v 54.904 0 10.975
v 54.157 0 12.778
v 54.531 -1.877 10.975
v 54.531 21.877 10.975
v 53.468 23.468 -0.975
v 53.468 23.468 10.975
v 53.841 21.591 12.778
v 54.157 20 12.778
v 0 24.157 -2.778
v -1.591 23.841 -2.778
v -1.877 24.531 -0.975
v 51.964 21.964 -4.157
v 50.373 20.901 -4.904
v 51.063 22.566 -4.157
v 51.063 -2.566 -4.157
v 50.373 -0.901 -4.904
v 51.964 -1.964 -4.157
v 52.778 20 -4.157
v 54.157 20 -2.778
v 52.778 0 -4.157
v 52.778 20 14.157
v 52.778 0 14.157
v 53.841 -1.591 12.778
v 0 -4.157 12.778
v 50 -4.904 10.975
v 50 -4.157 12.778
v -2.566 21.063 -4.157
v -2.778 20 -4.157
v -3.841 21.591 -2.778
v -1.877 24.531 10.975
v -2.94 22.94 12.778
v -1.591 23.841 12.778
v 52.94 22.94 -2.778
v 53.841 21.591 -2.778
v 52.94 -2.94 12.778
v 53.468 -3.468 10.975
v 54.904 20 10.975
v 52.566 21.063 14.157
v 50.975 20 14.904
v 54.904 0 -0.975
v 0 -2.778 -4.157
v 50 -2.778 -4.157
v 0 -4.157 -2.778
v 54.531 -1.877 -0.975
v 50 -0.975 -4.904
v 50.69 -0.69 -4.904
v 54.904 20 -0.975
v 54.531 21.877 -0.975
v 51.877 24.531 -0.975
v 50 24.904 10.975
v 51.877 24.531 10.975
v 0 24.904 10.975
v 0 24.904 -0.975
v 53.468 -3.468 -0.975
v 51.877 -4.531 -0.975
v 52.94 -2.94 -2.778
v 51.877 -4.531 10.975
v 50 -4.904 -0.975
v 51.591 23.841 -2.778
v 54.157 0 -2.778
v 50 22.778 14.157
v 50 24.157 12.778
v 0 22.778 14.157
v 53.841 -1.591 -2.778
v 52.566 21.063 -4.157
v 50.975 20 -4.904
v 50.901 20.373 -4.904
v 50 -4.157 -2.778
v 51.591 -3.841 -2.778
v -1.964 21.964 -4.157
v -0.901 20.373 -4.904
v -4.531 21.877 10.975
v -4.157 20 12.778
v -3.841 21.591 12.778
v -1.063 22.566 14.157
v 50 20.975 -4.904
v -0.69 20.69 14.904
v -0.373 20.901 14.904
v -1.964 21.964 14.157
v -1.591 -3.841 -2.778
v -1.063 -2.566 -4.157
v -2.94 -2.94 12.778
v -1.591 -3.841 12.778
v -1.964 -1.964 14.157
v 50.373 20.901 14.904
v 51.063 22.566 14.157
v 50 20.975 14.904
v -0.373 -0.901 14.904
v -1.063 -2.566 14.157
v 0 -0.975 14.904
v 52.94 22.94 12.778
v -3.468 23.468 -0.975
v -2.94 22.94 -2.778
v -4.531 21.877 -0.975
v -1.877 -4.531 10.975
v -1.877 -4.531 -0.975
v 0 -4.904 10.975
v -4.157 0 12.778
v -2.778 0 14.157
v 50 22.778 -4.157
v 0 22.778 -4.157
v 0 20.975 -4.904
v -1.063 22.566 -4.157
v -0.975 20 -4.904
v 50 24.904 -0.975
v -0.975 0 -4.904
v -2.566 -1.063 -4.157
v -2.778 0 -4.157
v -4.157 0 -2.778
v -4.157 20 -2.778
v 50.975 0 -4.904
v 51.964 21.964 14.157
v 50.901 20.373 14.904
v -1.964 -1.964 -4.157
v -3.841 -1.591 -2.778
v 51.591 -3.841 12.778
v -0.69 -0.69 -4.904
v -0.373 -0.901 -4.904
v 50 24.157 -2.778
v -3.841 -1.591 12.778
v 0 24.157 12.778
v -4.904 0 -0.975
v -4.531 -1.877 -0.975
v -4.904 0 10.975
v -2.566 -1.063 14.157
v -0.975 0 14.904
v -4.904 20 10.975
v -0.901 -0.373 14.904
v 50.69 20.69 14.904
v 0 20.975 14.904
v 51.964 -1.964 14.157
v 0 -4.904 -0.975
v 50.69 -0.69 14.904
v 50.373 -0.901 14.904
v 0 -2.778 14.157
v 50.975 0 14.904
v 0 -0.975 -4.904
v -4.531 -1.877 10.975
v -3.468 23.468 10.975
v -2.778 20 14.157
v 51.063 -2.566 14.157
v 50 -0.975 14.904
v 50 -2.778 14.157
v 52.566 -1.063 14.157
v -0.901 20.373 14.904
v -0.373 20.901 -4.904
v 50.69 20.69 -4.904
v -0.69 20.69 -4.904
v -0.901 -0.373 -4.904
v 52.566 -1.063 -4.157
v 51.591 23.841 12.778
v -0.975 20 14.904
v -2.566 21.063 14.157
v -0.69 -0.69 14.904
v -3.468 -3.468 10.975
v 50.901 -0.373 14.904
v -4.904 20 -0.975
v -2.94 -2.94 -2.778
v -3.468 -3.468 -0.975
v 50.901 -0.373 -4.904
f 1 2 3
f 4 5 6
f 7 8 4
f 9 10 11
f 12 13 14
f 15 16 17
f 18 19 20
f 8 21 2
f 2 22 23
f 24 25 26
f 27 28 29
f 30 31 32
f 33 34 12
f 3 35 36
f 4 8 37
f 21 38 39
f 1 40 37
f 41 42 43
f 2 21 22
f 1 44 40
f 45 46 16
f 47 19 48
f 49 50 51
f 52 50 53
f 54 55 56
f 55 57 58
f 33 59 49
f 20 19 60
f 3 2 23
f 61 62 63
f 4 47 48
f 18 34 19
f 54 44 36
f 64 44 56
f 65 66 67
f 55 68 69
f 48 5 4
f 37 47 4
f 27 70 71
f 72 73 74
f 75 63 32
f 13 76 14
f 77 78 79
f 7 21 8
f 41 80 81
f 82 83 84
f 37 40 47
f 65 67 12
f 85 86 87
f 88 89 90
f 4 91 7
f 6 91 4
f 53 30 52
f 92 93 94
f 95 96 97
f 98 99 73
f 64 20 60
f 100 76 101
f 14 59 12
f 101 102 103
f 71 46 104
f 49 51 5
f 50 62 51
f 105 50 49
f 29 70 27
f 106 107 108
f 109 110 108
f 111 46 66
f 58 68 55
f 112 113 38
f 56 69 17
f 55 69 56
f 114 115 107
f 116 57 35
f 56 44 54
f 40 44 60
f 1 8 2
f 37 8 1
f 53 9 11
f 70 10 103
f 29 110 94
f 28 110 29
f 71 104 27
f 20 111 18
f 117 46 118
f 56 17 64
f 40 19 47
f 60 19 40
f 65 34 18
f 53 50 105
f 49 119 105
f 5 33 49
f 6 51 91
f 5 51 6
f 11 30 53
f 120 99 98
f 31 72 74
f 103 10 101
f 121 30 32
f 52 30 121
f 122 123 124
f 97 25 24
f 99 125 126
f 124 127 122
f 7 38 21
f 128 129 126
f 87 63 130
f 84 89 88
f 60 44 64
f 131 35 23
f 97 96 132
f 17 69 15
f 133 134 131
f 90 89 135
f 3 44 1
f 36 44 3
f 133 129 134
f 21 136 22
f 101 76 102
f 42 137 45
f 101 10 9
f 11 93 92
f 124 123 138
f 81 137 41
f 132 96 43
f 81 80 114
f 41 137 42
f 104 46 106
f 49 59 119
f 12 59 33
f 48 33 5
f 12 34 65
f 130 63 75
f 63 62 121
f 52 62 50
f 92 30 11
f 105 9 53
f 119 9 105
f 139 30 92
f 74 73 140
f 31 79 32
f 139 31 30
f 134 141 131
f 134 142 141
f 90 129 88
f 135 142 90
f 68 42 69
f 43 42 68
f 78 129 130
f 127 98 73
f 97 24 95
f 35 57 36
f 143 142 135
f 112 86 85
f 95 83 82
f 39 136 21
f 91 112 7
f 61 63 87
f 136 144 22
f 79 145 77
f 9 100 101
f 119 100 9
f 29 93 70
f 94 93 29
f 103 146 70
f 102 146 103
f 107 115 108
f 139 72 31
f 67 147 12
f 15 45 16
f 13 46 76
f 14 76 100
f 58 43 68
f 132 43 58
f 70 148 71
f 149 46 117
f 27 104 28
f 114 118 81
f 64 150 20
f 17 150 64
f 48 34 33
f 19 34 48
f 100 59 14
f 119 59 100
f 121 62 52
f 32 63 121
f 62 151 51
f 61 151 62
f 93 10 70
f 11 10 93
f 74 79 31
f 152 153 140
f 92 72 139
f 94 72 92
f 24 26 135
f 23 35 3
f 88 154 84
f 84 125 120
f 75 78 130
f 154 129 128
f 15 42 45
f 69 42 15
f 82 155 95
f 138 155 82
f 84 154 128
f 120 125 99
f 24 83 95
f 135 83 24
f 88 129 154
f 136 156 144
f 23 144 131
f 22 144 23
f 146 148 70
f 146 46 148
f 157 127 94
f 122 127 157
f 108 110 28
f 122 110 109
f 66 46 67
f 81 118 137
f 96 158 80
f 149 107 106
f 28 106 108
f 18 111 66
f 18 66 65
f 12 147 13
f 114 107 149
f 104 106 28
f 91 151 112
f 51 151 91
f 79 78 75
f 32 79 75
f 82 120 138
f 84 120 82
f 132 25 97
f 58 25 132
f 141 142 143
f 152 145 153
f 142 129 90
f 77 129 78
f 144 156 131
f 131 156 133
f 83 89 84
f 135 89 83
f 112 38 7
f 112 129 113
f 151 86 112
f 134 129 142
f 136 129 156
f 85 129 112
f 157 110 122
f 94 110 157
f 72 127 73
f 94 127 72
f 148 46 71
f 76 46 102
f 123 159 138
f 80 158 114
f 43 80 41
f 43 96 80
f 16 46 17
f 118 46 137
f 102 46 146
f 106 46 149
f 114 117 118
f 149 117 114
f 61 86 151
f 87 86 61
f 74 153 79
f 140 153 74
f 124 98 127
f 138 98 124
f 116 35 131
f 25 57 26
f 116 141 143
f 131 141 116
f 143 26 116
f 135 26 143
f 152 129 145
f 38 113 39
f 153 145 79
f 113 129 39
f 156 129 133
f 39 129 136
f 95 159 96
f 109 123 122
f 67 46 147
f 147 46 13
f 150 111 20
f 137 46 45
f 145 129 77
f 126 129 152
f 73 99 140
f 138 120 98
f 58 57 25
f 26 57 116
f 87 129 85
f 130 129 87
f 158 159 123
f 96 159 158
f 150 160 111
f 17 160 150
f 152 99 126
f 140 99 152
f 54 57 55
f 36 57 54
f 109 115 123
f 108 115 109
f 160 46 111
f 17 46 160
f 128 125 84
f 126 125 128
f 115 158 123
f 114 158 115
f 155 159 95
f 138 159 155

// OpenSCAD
minkowski()
{
  translate([0, 0, 0])
  cube([50, 20, 10]);
  sphere(5);
}
